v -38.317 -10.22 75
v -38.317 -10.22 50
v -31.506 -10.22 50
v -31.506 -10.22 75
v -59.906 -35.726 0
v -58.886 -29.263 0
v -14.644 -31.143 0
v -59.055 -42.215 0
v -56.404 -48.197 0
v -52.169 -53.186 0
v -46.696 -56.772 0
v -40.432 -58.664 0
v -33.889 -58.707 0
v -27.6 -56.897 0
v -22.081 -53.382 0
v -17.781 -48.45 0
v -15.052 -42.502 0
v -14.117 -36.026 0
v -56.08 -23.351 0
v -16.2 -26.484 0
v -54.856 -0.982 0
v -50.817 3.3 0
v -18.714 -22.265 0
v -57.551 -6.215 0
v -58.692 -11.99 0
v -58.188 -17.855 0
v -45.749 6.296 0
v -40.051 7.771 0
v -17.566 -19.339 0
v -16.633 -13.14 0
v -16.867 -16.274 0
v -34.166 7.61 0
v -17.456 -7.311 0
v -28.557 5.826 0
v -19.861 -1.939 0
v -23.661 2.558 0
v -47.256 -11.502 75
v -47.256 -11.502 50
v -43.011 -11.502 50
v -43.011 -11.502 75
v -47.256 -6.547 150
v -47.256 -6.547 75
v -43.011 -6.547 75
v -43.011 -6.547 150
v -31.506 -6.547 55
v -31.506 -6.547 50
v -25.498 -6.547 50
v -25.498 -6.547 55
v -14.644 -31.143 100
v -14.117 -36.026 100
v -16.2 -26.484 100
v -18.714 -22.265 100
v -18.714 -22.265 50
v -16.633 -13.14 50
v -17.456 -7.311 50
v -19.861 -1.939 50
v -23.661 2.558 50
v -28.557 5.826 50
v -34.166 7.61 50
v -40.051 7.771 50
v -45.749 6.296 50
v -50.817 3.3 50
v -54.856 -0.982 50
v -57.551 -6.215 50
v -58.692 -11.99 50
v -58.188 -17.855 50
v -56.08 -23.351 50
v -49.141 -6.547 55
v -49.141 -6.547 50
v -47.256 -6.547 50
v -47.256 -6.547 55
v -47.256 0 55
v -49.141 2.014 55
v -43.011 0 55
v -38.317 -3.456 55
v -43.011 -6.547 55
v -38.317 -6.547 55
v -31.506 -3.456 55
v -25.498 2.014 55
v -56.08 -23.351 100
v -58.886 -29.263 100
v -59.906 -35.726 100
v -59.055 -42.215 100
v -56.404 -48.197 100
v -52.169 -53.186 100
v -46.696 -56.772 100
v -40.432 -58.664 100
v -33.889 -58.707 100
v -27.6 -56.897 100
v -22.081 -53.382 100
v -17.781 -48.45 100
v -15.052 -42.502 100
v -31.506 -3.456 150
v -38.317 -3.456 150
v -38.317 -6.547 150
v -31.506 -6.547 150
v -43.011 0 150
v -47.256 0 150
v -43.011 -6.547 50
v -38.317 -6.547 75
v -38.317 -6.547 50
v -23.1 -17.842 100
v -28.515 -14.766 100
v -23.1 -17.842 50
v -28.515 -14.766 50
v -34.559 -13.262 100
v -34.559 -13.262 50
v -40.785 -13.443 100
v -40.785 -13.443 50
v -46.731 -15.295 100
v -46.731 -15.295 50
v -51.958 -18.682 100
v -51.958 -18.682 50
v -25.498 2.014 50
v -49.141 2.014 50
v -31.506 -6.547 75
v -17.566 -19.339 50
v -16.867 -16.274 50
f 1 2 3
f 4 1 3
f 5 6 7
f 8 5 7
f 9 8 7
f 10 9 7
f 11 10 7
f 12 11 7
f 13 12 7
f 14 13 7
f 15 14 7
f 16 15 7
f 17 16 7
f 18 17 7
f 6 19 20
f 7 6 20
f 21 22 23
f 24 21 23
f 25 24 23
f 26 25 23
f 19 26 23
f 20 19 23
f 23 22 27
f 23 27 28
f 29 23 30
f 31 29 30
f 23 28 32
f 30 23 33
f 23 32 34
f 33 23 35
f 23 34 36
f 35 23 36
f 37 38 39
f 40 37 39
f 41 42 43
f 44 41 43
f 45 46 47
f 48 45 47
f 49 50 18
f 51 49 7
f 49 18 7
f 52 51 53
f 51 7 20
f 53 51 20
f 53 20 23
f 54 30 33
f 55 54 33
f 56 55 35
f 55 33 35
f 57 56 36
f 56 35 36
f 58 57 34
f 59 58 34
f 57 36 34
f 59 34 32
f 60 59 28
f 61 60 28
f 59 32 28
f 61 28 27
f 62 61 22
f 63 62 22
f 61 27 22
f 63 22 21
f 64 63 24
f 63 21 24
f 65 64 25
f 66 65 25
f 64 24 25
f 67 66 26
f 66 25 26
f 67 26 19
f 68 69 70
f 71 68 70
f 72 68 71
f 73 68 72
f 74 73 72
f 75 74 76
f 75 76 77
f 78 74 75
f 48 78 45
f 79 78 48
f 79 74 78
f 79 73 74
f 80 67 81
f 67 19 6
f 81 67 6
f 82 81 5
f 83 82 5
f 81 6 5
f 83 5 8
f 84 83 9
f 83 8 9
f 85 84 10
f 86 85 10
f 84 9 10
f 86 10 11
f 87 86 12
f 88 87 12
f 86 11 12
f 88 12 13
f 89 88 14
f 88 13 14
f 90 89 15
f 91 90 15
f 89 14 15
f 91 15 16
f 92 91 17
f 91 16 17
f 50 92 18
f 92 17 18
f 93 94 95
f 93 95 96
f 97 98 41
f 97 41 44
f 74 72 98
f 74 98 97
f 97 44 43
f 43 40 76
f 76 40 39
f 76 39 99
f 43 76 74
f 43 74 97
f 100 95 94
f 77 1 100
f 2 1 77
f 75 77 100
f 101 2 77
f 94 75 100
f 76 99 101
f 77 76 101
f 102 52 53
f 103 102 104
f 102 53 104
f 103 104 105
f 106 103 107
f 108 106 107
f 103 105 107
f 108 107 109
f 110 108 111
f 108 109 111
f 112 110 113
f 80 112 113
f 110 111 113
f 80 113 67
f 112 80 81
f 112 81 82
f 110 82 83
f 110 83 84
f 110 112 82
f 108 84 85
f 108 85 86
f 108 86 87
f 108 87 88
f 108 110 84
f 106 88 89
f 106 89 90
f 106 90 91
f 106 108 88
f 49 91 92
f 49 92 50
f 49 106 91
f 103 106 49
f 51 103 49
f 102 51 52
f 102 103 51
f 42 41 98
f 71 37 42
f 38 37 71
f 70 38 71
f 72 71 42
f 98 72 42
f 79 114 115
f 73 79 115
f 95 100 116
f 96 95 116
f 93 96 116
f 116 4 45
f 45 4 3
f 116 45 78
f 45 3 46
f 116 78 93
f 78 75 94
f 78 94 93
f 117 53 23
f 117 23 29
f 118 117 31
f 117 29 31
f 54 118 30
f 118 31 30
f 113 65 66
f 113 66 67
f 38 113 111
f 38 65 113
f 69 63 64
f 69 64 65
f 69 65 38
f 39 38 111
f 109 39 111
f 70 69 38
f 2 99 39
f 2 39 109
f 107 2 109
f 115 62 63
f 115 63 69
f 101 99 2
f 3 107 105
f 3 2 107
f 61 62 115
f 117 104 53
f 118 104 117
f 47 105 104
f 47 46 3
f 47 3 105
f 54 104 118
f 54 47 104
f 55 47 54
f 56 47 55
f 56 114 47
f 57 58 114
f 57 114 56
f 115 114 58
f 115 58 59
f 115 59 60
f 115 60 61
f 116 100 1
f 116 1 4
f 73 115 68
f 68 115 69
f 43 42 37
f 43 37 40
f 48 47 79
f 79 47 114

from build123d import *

# Parameters (mm, degrees)
F1_DEPTH = 100
F2_DEPTH = 50
F3_W     = 6.8111047149
F3_H     = 3.6732461303
F3_W_2   = 4.2452551425
F3_H_2   = 4.9546863884
F4_DEPTH = 25
F3_H_3   = 3.0913013034
F3_H_4   = 6.5471306443
F5_DEPTH = 100
F6_DEPTH = 5


with BuildPart() as f1:
    # F0 (on Top) → F1 (new body)
    with BuildSketch(Plane.XY):
        with BuildLine():
            ThreePointArc((-56.0795928311, -23.3514428312), (-43.6321915412, -57.9434272798), (-14.1167279775, -36.0258407891))
            ThreePointArc((-14.1167279775, -36.0258407891), (-15.2963829561, -28.7714614887), (-18.7137881744, -22.2646230493))
            ThreePointArc((-18.7137881744, -22.2646230493), (-37.0660364689, -34.1762047765), (-56.0795928311, -23.3514428312))
        make_face()
        with BuildLine():
            ThreePointArc((-56.0795928311, -23.3514428312), (-37.0660364689, -34.1762047765), (-18.7137881744, -22.2646230493))
            ThreePointArc((-18.7137881744, -22.2646230493), (-37.6778941182, -13.1400092827), (-56.0795928311, -23.3514428312))
        make_face()
    extrude(amount=F1_DEPTH)

    # F0 (on Top) → F2 (join)
    with BuildSketch(Plane.XY):
        with BuildLine():
            ThreePointArc((-56.0795928311, -23.3514428312), (-37.6778941182, -13.1400092827), (-18.7137881744, -22.2646230493))
            ThreePointArc((-18.7137881744, -22.2646230493), (-17.1596431946, -17.8194611389), (-16.6328022762, -13.1400092827))
            ThreePointArc((-16.6328022762, -13.1400092827), (-42.9519082998, 7.2335192543), (-56.0795928311, -23.3514428312))
        make_face()
    extrude(amount=F2_DEPTH)

    # F3 (on face) → F4 (join)
    with BuildSketch(Plane.XY.offset(50)):
        with Locations((-34.9110998213, -8.3837537095)):
            Rectangle(F3_W, F3_H)
        with Locations((-45.1333094388, -9.0244738385)):
            Rectangle(F3_W_2, F3_H_2)
    extrude(amount=F4_DEPTH)

    # F3 (on face) → F5 (join)
    with BuildSketch(Plane.XY.offset(50)):
        with Locations((-34.9110998213, -5.0014799926)):
            Rectangle(F3_W, F3_H_3)
        with Locations((-45.1333094388, -3.2735653222)):
            Rectangle(F3_W_2, F3_H_4)
    extrude(amount=F5_DEPTH)

    # F3 (on face) → F6 (join)
    with BuildSketch(Plane.XY.offset(50)):
        Polygon((-31.5055474639, -6.5471306443), (-25.4983492196, -6.5471306443), (-25.4983492196, 2.0140481647), (-49.141228199, 2.0140481647), (-49.141228199, -6.5471306443), (-47.25593701, -6.5471306443), (-47.25593701, 0), (-43.0106818676, 0), (-43.0106818676, -6.5471306443), (-38.3166521788, -6.5471306443), (-38.3166521788, -3.455829341), (-31.5055474639, -3.455829341), align=None)
    extrude(amount=F6_DEPTH)


solid = f1.part
